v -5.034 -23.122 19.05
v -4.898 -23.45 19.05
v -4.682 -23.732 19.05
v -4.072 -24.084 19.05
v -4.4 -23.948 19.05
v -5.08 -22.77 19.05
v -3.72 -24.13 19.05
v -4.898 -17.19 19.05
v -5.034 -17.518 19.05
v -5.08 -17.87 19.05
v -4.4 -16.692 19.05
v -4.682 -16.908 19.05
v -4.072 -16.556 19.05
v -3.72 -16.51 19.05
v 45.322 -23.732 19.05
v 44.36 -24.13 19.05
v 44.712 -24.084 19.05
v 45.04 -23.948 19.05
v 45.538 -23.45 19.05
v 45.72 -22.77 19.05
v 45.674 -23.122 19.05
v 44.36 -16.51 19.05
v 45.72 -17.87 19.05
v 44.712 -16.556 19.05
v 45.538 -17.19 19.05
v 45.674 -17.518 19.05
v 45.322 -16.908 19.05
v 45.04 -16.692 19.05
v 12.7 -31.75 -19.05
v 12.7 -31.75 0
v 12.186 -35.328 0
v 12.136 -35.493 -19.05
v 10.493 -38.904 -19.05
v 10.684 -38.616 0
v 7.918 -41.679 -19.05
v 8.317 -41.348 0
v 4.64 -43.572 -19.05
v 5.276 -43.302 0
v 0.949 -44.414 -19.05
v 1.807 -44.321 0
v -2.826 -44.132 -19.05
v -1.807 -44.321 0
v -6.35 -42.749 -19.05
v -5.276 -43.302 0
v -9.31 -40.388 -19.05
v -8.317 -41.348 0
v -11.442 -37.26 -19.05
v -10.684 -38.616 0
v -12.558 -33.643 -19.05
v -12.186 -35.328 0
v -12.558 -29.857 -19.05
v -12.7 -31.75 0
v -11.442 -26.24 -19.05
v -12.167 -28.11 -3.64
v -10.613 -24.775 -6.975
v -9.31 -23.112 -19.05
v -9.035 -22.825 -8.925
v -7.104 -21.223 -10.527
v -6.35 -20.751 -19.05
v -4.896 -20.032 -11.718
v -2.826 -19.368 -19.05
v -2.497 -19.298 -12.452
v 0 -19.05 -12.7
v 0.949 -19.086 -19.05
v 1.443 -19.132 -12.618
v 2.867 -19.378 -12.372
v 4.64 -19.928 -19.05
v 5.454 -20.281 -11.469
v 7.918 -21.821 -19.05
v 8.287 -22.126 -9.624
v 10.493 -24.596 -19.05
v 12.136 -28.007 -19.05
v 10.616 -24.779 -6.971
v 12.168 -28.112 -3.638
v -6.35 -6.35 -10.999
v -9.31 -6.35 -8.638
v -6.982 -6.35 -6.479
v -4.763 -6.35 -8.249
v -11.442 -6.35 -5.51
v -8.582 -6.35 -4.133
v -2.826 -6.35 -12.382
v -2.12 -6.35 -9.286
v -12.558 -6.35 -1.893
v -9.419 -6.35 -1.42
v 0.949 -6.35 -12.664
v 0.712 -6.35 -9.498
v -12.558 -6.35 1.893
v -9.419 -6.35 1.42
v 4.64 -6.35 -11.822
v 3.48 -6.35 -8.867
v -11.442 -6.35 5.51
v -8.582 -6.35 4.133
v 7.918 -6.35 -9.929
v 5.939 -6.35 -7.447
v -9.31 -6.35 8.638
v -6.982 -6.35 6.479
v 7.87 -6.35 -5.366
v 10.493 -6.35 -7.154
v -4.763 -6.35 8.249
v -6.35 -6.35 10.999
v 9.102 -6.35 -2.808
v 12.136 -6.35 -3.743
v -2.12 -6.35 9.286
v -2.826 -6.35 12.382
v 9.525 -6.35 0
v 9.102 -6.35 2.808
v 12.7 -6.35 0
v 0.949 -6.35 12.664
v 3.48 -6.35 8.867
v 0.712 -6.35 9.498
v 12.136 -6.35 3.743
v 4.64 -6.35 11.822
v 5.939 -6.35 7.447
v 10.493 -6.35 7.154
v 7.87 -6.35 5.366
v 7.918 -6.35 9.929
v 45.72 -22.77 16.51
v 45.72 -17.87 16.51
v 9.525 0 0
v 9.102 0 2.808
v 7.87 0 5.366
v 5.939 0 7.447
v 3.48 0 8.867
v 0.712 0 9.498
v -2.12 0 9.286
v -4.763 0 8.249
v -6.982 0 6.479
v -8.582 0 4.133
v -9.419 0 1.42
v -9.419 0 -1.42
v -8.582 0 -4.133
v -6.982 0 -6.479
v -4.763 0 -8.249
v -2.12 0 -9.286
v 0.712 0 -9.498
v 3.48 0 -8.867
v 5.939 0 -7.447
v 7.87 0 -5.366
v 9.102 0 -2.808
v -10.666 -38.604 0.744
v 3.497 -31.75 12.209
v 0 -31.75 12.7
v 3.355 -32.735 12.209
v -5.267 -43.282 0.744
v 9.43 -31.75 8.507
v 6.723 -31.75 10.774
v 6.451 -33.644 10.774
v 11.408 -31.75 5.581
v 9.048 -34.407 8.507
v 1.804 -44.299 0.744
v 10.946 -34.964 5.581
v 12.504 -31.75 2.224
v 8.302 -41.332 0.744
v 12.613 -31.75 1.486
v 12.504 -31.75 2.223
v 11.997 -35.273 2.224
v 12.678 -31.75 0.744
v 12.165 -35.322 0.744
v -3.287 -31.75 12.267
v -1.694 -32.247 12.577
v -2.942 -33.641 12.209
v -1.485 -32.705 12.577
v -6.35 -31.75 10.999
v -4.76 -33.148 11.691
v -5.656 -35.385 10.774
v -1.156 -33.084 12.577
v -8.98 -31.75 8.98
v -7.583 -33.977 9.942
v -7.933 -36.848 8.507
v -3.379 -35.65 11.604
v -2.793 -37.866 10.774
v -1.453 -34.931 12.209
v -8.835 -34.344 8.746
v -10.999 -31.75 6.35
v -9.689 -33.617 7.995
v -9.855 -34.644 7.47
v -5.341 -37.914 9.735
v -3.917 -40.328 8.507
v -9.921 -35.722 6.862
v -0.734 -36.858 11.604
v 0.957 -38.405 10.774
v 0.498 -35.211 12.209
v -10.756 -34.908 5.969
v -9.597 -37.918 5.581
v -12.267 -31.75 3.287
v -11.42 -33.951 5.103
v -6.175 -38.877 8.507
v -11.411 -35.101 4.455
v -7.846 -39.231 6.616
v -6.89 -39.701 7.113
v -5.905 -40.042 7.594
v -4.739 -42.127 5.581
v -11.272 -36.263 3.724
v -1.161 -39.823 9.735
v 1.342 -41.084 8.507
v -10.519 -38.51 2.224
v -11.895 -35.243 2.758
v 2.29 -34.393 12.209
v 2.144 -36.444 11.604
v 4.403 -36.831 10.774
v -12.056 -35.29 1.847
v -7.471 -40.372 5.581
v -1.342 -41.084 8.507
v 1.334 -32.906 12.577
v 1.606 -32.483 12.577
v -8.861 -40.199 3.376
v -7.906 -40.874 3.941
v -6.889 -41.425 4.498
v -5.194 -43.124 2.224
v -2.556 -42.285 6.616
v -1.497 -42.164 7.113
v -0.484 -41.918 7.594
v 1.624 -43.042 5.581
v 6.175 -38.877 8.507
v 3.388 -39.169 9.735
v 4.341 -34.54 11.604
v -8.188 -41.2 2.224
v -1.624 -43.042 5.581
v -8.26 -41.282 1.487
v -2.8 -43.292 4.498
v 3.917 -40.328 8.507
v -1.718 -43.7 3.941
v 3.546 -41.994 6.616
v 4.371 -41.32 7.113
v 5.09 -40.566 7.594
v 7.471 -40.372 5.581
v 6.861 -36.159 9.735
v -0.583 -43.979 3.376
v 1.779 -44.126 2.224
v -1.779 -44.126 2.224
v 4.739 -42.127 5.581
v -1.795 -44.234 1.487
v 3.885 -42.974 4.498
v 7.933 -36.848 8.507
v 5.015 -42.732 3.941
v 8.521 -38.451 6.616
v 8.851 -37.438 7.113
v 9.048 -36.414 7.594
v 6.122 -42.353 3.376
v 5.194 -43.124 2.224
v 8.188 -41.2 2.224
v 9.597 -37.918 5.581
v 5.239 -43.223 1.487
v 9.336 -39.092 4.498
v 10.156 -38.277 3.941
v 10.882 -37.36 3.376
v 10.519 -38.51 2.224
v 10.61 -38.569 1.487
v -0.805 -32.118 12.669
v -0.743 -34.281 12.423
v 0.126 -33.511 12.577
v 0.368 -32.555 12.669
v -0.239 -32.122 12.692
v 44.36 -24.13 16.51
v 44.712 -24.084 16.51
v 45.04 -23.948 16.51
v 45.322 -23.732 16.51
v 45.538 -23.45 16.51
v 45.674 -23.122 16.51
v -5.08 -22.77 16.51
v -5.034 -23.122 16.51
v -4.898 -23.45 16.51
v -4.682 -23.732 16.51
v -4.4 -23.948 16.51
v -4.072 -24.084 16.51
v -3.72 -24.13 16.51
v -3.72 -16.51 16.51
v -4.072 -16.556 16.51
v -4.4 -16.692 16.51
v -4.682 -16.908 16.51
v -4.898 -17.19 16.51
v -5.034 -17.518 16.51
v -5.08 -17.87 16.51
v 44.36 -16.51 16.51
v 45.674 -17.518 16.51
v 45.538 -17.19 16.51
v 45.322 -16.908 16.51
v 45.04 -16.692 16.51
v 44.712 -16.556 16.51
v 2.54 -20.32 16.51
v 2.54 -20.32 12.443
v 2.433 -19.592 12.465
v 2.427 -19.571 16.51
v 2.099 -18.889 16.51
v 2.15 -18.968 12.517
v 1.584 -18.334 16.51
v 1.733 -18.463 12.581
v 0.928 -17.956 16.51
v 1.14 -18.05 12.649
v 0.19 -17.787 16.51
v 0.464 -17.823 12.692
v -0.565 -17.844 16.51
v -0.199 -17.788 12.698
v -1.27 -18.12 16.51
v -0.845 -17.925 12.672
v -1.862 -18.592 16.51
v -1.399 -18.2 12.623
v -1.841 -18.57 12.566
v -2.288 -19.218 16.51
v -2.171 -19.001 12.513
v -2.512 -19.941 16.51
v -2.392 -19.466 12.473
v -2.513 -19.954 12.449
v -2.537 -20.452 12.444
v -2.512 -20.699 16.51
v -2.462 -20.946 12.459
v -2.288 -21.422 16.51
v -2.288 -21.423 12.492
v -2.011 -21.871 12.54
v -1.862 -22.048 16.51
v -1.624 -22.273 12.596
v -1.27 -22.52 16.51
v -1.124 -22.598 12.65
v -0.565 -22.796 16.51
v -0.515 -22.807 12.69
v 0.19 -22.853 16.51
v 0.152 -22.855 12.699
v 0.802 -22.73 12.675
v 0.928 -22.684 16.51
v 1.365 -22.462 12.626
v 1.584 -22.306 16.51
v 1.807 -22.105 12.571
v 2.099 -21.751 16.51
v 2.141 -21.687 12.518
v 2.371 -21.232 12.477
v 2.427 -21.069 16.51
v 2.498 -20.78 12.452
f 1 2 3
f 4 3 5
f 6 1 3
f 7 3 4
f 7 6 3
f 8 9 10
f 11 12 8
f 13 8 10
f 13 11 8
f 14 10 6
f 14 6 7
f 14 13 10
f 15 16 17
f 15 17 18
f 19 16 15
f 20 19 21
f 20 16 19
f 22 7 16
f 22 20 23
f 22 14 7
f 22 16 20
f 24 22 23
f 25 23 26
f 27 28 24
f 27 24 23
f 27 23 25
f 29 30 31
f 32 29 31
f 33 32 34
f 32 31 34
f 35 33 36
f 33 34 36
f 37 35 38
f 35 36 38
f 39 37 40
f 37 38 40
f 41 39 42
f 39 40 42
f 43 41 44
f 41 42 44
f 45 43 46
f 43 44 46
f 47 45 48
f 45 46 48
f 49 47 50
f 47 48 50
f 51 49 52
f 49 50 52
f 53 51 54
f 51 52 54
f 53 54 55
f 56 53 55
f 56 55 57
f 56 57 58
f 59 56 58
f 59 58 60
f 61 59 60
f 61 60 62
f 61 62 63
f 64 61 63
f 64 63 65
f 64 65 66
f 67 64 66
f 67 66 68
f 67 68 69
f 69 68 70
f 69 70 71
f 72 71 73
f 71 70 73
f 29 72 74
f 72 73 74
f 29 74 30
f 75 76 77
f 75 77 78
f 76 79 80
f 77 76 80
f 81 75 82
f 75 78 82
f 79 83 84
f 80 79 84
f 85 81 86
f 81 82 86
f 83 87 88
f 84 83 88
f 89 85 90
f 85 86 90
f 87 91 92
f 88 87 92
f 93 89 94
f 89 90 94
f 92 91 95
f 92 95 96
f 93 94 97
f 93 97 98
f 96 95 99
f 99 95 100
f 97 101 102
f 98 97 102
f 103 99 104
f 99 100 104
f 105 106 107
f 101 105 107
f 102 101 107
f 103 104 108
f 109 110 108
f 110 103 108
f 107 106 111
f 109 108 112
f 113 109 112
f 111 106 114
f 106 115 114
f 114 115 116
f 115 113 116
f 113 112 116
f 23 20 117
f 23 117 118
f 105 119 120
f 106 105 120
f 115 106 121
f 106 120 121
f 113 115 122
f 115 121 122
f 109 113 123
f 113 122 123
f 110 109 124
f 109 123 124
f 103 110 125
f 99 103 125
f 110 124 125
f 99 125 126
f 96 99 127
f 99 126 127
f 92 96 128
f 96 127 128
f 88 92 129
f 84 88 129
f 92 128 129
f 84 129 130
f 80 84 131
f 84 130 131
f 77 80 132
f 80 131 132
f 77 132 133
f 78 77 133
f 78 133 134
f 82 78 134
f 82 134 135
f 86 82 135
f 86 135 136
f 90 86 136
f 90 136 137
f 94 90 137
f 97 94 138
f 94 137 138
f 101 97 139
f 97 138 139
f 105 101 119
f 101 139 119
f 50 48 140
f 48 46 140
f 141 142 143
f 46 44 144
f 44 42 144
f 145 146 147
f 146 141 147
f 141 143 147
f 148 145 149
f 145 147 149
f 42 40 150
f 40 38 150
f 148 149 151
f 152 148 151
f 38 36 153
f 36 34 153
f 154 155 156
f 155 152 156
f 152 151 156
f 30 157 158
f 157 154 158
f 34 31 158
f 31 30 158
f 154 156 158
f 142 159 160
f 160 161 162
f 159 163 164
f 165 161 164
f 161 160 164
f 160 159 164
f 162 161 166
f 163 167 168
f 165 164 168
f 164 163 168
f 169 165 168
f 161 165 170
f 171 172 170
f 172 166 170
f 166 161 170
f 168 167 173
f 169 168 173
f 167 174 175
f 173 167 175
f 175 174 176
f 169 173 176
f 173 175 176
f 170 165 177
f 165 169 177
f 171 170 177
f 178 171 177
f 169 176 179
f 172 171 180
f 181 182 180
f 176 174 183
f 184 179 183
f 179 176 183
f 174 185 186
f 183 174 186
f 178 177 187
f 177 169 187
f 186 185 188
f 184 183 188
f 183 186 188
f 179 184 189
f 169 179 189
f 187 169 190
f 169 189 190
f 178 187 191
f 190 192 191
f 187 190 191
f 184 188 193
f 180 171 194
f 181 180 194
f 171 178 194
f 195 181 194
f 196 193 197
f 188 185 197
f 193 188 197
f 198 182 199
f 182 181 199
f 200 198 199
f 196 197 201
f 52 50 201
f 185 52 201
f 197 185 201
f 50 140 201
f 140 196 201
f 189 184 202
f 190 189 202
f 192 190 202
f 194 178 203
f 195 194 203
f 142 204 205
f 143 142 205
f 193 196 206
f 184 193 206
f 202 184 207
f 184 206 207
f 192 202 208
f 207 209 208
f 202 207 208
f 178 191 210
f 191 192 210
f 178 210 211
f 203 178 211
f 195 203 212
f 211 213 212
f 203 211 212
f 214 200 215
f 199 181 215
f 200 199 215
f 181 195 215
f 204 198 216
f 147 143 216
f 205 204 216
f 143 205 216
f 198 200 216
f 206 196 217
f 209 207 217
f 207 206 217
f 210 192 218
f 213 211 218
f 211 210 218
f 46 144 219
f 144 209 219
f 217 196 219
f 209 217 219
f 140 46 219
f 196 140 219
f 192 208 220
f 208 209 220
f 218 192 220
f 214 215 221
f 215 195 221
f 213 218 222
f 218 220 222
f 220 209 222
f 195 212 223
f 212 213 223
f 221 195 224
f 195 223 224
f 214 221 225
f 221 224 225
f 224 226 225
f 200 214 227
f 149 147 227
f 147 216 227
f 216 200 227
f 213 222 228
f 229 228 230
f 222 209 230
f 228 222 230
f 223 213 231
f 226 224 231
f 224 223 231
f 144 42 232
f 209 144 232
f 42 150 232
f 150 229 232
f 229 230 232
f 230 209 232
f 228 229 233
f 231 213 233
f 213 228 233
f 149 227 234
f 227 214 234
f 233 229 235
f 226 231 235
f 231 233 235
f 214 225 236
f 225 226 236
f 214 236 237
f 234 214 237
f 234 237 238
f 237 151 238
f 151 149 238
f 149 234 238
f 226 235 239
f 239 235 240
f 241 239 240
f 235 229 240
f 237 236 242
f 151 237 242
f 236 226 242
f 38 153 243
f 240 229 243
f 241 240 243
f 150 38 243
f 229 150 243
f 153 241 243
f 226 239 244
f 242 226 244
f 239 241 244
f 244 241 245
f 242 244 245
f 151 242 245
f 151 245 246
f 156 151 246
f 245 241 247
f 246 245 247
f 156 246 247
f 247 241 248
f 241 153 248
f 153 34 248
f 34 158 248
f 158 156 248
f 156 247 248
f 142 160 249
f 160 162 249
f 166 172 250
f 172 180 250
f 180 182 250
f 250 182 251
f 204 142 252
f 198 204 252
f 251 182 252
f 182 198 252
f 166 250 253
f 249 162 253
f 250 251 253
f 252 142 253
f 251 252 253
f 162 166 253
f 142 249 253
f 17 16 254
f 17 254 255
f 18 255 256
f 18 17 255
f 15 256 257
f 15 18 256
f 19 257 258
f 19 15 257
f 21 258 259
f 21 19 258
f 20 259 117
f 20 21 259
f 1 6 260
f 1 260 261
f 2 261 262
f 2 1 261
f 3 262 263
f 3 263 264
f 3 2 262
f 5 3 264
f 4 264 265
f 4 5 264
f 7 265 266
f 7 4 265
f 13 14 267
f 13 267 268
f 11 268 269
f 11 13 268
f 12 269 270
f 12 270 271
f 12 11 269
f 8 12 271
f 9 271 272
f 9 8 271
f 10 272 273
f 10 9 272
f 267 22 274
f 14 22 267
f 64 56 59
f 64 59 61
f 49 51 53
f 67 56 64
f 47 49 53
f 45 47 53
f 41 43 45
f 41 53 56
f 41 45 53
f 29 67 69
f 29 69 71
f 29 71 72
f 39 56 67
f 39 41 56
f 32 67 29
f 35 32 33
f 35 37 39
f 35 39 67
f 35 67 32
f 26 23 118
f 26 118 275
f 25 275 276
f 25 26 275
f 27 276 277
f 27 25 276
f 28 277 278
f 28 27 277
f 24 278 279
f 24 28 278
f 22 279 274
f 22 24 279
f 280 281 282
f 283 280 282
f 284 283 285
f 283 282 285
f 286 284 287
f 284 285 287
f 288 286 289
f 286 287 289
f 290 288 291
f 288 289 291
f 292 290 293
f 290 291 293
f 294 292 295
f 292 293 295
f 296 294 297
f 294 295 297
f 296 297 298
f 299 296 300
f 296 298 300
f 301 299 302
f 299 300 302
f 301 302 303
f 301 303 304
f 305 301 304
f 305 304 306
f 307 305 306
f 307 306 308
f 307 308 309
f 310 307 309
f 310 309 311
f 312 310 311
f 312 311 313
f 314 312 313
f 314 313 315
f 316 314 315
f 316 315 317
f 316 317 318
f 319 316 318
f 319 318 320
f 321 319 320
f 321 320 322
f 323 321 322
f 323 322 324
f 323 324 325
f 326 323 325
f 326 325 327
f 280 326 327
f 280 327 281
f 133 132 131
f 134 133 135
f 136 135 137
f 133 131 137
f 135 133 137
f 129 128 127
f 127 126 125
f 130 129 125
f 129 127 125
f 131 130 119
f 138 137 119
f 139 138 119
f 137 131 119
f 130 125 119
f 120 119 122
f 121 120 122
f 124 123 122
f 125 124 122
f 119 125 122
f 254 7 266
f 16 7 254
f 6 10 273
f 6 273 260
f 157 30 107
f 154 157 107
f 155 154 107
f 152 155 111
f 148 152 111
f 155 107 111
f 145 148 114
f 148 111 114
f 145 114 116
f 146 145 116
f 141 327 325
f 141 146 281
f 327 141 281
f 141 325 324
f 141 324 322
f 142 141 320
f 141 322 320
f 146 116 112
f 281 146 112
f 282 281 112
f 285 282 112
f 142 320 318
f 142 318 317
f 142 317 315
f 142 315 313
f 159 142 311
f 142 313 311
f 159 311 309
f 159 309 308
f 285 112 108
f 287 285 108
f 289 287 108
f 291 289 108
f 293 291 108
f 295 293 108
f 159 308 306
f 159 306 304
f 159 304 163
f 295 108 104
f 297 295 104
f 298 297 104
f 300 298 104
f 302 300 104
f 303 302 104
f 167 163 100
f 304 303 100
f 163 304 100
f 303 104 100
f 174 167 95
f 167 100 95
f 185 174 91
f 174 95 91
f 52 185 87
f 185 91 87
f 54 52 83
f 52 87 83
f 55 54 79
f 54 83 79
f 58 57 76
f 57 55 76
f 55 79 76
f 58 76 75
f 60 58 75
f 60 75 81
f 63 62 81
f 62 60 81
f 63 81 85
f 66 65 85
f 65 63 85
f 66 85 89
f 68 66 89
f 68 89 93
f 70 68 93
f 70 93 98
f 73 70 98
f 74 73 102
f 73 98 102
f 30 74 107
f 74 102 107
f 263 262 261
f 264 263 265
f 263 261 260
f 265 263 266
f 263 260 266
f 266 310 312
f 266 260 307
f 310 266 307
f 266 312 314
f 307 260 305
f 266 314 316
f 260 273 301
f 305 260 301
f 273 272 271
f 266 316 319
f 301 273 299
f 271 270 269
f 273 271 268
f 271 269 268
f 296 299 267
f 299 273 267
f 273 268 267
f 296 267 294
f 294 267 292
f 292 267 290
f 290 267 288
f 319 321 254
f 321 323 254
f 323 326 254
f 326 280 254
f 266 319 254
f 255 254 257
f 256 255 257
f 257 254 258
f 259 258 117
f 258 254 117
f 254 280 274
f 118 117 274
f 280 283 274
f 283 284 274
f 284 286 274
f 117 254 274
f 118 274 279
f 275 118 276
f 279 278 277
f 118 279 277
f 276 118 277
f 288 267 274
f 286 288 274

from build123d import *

# Parameters (mm, degrees)
F0_R      = 9.525
F1_DEPTH  = 6.35
F2_R      = 12.7
F3_DEPTH  = 25.4
F6_R      = 12.7
F7_DEPTH  = 19.05
F8_R      = 2.54
F9_DEPTH  = 19.05
F10_R     = 2.54
F11_DEPTH = 2.54


with BuildPart() as f1:
    # F0 (on Front) → F1 (new body)
    with BuildSketch(Plane.XZ):
        Circle(F0_R)
    extrude(amount=F1_DEPTH)

    # F2 (on face) → F3 (join)
    with BuildSketch(Plane.XZ.offset(6.35)):
        Circle(F2_R)
    extrude(amount=F3_DEPTH)

    # F4 (on Right) → F5 (revolve)
    with BuildSketch(Plane.YZ):
        with BuildLine():
            Line((-31.75, 0), (-31.75, 12.7))
            ThreePointArc((-31.75, 12.7), (-40.730256, 8.980256), (-44.45, 0))
            Line((-44.45, 0), (-31.75, 0))
        make_face()
    revolve(axis=Axis((0, -31.75, 6.35), (0, 0, 1)))

    # F6 (on face) → F7 (join)
    with BuildSketch(Plane(origin=(0, 0, 0), x_dir=(1, 0, 0), z_dir=(0, 0, -1))):
        with Locations((0, 31.75)):
            Circle(F6_R)
    extrude(amount=F7_DEPTH)

    # F8 (on Top) → F9 (join)
    with BuildSketch(Plane.XY):
        with Locations((0, -20.32)):
            Circle(F8_R)
    extrude(amount=F9_DEPTH)

    # F10 (on face) → F11 (join)
    with BuildSketch(Plane.XY.offset(19.05)):
        with BuildLine():
            ThreePointArc((45.72, -17.869775), (45.321731, -16.908269), (44.360225, -16.51))
            Line((44.360225, -16.51), (-3.720225, -16.51))
            ThreePointArc((-3.720225, -16.51), (-4.681731, -16.908269), (-5.08, -17.869775))
            Line((-5.08, -17.869775), (-5.08, -22.770225))
            ThreePointArc((-5.08, -22.770225), (-4.681731, -23.731731), (-3.720225, -24.13))
            Line((-3.720225, -24.13), (44.360225, -24.13))
            ThreePointArc((44.360225, -24.13), (45.321731, -23.731731), (45.72, -22.770225))
            Line((45.72, -22.770225), (45.72, -17.869775))
        make_face()
        with Locations((0, -20.32)):
            Circle(F10_R, mode=Mode.SUBTRACT)
    extrude(amount=-F11_DEPTH)


solid = f1.part
